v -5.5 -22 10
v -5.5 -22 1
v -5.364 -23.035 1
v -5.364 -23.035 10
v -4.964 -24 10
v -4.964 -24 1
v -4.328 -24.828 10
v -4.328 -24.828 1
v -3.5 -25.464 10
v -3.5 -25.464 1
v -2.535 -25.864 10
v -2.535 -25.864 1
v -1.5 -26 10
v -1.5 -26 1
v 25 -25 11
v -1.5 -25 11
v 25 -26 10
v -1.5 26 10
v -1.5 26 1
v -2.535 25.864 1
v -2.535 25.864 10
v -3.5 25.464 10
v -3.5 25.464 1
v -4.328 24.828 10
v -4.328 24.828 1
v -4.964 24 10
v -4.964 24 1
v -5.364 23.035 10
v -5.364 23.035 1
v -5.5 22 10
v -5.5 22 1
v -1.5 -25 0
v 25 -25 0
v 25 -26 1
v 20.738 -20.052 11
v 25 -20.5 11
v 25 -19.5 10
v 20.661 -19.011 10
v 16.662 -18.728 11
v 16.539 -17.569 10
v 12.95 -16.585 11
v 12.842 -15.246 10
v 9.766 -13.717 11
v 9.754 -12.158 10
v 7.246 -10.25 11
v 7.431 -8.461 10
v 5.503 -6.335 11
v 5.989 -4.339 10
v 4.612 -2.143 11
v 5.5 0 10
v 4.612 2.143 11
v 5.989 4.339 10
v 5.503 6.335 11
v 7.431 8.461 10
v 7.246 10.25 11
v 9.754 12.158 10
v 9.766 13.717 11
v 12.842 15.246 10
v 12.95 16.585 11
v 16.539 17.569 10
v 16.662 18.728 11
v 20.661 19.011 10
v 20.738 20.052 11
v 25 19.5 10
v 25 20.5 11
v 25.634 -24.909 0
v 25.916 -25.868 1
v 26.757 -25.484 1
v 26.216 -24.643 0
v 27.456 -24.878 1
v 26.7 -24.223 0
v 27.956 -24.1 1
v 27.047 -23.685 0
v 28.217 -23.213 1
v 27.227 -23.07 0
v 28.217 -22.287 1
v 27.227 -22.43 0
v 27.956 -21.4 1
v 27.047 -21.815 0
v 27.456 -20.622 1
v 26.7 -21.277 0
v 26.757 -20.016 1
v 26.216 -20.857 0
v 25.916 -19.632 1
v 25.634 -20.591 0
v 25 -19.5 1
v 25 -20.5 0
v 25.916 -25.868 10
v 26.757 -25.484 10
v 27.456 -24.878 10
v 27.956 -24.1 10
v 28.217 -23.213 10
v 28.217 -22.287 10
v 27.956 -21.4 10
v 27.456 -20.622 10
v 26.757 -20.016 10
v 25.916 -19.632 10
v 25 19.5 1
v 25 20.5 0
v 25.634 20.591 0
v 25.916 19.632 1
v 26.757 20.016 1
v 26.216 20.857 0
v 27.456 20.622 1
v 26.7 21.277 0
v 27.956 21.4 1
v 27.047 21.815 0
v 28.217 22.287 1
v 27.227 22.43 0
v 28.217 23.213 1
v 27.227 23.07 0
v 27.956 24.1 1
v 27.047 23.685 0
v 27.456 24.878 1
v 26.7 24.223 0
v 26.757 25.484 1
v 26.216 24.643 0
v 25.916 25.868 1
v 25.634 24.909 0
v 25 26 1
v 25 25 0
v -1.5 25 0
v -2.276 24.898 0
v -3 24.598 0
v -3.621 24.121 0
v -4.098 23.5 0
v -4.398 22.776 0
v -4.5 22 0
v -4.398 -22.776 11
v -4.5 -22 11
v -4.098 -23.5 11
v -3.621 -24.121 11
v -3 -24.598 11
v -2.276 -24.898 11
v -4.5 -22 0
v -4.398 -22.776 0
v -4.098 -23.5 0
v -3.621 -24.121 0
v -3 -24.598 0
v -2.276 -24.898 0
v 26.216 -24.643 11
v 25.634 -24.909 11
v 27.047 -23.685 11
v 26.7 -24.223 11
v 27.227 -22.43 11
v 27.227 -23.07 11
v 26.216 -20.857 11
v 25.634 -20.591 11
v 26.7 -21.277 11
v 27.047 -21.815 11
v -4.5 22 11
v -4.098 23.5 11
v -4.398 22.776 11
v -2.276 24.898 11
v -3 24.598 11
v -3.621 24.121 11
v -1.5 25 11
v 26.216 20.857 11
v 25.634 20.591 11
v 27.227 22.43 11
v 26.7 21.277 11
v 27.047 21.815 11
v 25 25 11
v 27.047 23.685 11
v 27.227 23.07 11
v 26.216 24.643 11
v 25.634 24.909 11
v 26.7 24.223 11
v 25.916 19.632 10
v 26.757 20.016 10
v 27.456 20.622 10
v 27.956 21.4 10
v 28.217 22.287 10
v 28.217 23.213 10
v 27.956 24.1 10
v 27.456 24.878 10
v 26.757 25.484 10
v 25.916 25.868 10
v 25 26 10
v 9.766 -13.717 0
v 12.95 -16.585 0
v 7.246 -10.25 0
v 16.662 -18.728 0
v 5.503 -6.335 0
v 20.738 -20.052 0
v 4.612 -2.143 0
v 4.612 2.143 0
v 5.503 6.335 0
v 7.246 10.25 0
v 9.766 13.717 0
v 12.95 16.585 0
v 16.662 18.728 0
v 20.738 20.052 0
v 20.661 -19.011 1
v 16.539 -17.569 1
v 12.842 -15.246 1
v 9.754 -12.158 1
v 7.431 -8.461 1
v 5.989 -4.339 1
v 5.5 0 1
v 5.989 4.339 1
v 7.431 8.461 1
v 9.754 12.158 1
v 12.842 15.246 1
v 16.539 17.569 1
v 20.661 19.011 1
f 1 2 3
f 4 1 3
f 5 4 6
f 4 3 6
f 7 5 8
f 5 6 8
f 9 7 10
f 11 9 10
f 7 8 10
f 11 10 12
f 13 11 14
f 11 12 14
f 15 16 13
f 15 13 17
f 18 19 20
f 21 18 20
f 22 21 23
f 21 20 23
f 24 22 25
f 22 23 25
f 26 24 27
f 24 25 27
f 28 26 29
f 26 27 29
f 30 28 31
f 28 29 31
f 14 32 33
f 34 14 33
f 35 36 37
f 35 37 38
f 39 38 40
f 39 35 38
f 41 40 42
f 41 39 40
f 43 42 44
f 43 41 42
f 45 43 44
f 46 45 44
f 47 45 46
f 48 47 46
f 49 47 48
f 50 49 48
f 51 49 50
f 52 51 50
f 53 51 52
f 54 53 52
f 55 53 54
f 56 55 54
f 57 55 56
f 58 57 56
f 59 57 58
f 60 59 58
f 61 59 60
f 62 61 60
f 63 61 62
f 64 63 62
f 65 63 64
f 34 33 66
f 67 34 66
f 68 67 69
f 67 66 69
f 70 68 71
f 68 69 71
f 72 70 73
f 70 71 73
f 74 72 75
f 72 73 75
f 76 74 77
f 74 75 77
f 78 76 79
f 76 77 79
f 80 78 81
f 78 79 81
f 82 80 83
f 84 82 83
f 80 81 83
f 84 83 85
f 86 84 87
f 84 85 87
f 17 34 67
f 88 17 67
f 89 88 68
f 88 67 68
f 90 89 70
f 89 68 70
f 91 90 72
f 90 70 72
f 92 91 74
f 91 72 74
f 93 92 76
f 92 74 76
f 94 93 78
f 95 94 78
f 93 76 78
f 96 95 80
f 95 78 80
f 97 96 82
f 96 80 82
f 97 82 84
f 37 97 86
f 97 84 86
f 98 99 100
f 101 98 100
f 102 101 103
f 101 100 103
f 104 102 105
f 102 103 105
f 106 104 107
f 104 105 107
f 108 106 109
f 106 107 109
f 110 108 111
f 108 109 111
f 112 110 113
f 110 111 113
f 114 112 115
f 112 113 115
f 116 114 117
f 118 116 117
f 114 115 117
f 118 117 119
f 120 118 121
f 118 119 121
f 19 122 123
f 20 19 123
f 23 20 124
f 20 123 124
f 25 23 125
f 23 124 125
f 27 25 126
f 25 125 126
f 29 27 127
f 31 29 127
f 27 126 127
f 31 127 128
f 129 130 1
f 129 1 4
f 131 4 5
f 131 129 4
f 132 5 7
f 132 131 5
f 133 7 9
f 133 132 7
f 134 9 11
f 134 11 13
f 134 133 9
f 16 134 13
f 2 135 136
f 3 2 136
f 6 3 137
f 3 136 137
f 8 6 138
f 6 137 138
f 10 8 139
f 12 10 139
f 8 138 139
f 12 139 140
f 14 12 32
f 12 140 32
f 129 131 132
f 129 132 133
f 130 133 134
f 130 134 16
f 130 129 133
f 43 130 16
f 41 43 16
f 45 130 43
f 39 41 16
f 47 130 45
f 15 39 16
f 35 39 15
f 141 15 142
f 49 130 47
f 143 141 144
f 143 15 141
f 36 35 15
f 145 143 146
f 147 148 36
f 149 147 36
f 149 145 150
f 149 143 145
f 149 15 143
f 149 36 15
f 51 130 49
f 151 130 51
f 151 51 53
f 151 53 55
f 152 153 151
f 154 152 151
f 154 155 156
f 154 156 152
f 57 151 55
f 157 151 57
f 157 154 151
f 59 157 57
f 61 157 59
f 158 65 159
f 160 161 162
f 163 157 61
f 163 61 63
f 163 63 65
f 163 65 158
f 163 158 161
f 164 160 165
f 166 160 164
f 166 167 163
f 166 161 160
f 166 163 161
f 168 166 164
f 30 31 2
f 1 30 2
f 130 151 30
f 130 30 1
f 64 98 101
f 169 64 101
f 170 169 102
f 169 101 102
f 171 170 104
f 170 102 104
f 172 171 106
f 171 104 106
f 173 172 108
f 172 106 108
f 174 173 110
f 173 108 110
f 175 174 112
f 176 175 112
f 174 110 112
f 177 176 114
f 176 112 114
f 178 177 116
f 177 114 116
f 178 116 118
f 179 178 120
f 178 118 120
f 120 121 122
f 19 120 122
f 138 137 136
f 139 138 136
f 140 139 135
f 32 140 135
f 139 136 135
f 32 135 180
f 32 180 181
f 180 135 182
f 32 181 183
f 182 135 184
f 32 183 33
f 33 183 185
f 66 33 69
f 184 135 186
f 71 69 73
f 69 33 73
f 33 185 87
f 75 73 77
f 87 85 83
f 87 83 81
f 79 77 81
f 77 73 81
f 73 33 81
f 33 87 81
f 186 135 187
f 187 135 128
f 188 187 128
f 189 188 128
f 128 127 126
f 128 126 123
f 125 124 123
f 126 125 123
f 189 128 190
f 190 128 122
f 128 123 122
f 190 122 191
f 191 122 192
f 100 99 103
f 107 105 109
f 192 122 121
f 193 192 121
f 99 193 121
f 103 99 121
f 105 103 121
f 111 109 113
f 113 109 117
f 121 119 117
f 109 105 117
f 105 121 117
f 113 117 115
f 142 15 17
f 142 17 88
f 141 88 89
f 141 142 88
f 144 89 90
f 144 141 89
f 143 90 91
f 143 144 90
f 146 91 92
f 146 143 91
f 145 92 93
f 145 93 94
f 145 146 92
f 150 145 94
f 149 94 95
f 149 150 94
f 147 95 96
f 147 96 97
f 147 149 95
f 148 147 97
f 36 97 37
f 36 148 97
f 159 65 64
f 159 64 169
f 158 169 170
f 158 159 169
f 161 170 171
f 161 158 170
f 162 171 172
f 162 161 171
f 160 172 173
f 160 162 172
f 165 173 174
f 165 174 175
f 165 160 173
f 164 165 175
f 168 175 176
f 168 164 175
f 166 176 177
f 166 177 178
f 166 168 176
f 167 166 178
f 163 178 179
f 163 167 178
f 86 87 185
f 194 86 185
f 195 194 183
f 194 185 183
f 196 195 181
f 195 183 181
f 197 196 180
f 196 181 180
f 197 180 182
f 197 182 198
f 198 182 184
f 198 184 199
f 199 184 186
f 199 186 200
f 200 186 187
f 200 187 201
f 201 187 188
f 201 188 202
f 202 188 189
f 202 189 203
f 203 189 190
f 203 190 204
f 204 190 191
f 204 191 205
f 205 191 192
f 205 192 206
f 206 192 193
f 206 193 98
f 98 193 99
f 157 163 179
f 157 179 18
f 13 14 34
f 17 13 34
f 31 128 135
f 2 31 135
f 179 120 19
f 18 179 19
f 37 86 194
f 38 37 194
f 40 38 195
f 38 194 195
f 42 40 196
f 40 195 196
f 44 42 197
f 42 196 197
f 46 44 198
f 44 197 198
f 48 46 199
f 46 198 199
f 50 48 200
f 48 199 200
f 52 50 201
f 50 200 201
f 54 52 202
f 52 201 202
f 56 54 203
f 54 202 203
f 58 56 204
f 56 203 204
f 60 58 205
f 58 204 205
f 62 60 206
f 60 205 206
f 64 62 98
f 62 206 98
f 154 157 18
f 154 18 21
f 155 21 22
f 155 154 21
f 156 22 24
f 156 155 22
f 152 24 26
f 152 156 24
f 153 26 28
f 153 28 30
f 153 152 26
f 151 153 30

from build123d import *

# Parameters (mm, degrees)
F1_DEPTH = 11
F2_SIZE  = 1


with BuildPart() as f1:
    # F0 (on Top) → F1 (new body)
    with BuildSketch(Plane.XY):
        with BuildLine():
            ThreePointArc((25, -19.5), (5.5, 0), (25, 19.5))
            ThreePointArc((25, 19.5), (28.25, 22.75), (25, 26))
            Line((25, 26), (-1.5, 26))
            ThreePointArc((-1.5, 26), (-4.328427, 24.828427), (-5.5, 22))
            Line((-5.5, 22), (-5.5, -22))
            ThreePointArc((-5.5, -22), (-4.328427, -24.828427), (-1.5, -26))
            Line((-1.5, -26), (25, -26))
            ThreePointArc((25, -26), (28.25, -22.75), (25, -19.5))
        make_face()
    extrude(amount=F1_DEPTH)

    # F2
    f2_edges = [f1.edges().sort_by_distance(p)[0] for p in [
        (5.5, 0, 11),
        (5.5, 0, 0),
    ]]
    chamfer(f2_edges, length=F2_SIZE)


solid = f1.part
